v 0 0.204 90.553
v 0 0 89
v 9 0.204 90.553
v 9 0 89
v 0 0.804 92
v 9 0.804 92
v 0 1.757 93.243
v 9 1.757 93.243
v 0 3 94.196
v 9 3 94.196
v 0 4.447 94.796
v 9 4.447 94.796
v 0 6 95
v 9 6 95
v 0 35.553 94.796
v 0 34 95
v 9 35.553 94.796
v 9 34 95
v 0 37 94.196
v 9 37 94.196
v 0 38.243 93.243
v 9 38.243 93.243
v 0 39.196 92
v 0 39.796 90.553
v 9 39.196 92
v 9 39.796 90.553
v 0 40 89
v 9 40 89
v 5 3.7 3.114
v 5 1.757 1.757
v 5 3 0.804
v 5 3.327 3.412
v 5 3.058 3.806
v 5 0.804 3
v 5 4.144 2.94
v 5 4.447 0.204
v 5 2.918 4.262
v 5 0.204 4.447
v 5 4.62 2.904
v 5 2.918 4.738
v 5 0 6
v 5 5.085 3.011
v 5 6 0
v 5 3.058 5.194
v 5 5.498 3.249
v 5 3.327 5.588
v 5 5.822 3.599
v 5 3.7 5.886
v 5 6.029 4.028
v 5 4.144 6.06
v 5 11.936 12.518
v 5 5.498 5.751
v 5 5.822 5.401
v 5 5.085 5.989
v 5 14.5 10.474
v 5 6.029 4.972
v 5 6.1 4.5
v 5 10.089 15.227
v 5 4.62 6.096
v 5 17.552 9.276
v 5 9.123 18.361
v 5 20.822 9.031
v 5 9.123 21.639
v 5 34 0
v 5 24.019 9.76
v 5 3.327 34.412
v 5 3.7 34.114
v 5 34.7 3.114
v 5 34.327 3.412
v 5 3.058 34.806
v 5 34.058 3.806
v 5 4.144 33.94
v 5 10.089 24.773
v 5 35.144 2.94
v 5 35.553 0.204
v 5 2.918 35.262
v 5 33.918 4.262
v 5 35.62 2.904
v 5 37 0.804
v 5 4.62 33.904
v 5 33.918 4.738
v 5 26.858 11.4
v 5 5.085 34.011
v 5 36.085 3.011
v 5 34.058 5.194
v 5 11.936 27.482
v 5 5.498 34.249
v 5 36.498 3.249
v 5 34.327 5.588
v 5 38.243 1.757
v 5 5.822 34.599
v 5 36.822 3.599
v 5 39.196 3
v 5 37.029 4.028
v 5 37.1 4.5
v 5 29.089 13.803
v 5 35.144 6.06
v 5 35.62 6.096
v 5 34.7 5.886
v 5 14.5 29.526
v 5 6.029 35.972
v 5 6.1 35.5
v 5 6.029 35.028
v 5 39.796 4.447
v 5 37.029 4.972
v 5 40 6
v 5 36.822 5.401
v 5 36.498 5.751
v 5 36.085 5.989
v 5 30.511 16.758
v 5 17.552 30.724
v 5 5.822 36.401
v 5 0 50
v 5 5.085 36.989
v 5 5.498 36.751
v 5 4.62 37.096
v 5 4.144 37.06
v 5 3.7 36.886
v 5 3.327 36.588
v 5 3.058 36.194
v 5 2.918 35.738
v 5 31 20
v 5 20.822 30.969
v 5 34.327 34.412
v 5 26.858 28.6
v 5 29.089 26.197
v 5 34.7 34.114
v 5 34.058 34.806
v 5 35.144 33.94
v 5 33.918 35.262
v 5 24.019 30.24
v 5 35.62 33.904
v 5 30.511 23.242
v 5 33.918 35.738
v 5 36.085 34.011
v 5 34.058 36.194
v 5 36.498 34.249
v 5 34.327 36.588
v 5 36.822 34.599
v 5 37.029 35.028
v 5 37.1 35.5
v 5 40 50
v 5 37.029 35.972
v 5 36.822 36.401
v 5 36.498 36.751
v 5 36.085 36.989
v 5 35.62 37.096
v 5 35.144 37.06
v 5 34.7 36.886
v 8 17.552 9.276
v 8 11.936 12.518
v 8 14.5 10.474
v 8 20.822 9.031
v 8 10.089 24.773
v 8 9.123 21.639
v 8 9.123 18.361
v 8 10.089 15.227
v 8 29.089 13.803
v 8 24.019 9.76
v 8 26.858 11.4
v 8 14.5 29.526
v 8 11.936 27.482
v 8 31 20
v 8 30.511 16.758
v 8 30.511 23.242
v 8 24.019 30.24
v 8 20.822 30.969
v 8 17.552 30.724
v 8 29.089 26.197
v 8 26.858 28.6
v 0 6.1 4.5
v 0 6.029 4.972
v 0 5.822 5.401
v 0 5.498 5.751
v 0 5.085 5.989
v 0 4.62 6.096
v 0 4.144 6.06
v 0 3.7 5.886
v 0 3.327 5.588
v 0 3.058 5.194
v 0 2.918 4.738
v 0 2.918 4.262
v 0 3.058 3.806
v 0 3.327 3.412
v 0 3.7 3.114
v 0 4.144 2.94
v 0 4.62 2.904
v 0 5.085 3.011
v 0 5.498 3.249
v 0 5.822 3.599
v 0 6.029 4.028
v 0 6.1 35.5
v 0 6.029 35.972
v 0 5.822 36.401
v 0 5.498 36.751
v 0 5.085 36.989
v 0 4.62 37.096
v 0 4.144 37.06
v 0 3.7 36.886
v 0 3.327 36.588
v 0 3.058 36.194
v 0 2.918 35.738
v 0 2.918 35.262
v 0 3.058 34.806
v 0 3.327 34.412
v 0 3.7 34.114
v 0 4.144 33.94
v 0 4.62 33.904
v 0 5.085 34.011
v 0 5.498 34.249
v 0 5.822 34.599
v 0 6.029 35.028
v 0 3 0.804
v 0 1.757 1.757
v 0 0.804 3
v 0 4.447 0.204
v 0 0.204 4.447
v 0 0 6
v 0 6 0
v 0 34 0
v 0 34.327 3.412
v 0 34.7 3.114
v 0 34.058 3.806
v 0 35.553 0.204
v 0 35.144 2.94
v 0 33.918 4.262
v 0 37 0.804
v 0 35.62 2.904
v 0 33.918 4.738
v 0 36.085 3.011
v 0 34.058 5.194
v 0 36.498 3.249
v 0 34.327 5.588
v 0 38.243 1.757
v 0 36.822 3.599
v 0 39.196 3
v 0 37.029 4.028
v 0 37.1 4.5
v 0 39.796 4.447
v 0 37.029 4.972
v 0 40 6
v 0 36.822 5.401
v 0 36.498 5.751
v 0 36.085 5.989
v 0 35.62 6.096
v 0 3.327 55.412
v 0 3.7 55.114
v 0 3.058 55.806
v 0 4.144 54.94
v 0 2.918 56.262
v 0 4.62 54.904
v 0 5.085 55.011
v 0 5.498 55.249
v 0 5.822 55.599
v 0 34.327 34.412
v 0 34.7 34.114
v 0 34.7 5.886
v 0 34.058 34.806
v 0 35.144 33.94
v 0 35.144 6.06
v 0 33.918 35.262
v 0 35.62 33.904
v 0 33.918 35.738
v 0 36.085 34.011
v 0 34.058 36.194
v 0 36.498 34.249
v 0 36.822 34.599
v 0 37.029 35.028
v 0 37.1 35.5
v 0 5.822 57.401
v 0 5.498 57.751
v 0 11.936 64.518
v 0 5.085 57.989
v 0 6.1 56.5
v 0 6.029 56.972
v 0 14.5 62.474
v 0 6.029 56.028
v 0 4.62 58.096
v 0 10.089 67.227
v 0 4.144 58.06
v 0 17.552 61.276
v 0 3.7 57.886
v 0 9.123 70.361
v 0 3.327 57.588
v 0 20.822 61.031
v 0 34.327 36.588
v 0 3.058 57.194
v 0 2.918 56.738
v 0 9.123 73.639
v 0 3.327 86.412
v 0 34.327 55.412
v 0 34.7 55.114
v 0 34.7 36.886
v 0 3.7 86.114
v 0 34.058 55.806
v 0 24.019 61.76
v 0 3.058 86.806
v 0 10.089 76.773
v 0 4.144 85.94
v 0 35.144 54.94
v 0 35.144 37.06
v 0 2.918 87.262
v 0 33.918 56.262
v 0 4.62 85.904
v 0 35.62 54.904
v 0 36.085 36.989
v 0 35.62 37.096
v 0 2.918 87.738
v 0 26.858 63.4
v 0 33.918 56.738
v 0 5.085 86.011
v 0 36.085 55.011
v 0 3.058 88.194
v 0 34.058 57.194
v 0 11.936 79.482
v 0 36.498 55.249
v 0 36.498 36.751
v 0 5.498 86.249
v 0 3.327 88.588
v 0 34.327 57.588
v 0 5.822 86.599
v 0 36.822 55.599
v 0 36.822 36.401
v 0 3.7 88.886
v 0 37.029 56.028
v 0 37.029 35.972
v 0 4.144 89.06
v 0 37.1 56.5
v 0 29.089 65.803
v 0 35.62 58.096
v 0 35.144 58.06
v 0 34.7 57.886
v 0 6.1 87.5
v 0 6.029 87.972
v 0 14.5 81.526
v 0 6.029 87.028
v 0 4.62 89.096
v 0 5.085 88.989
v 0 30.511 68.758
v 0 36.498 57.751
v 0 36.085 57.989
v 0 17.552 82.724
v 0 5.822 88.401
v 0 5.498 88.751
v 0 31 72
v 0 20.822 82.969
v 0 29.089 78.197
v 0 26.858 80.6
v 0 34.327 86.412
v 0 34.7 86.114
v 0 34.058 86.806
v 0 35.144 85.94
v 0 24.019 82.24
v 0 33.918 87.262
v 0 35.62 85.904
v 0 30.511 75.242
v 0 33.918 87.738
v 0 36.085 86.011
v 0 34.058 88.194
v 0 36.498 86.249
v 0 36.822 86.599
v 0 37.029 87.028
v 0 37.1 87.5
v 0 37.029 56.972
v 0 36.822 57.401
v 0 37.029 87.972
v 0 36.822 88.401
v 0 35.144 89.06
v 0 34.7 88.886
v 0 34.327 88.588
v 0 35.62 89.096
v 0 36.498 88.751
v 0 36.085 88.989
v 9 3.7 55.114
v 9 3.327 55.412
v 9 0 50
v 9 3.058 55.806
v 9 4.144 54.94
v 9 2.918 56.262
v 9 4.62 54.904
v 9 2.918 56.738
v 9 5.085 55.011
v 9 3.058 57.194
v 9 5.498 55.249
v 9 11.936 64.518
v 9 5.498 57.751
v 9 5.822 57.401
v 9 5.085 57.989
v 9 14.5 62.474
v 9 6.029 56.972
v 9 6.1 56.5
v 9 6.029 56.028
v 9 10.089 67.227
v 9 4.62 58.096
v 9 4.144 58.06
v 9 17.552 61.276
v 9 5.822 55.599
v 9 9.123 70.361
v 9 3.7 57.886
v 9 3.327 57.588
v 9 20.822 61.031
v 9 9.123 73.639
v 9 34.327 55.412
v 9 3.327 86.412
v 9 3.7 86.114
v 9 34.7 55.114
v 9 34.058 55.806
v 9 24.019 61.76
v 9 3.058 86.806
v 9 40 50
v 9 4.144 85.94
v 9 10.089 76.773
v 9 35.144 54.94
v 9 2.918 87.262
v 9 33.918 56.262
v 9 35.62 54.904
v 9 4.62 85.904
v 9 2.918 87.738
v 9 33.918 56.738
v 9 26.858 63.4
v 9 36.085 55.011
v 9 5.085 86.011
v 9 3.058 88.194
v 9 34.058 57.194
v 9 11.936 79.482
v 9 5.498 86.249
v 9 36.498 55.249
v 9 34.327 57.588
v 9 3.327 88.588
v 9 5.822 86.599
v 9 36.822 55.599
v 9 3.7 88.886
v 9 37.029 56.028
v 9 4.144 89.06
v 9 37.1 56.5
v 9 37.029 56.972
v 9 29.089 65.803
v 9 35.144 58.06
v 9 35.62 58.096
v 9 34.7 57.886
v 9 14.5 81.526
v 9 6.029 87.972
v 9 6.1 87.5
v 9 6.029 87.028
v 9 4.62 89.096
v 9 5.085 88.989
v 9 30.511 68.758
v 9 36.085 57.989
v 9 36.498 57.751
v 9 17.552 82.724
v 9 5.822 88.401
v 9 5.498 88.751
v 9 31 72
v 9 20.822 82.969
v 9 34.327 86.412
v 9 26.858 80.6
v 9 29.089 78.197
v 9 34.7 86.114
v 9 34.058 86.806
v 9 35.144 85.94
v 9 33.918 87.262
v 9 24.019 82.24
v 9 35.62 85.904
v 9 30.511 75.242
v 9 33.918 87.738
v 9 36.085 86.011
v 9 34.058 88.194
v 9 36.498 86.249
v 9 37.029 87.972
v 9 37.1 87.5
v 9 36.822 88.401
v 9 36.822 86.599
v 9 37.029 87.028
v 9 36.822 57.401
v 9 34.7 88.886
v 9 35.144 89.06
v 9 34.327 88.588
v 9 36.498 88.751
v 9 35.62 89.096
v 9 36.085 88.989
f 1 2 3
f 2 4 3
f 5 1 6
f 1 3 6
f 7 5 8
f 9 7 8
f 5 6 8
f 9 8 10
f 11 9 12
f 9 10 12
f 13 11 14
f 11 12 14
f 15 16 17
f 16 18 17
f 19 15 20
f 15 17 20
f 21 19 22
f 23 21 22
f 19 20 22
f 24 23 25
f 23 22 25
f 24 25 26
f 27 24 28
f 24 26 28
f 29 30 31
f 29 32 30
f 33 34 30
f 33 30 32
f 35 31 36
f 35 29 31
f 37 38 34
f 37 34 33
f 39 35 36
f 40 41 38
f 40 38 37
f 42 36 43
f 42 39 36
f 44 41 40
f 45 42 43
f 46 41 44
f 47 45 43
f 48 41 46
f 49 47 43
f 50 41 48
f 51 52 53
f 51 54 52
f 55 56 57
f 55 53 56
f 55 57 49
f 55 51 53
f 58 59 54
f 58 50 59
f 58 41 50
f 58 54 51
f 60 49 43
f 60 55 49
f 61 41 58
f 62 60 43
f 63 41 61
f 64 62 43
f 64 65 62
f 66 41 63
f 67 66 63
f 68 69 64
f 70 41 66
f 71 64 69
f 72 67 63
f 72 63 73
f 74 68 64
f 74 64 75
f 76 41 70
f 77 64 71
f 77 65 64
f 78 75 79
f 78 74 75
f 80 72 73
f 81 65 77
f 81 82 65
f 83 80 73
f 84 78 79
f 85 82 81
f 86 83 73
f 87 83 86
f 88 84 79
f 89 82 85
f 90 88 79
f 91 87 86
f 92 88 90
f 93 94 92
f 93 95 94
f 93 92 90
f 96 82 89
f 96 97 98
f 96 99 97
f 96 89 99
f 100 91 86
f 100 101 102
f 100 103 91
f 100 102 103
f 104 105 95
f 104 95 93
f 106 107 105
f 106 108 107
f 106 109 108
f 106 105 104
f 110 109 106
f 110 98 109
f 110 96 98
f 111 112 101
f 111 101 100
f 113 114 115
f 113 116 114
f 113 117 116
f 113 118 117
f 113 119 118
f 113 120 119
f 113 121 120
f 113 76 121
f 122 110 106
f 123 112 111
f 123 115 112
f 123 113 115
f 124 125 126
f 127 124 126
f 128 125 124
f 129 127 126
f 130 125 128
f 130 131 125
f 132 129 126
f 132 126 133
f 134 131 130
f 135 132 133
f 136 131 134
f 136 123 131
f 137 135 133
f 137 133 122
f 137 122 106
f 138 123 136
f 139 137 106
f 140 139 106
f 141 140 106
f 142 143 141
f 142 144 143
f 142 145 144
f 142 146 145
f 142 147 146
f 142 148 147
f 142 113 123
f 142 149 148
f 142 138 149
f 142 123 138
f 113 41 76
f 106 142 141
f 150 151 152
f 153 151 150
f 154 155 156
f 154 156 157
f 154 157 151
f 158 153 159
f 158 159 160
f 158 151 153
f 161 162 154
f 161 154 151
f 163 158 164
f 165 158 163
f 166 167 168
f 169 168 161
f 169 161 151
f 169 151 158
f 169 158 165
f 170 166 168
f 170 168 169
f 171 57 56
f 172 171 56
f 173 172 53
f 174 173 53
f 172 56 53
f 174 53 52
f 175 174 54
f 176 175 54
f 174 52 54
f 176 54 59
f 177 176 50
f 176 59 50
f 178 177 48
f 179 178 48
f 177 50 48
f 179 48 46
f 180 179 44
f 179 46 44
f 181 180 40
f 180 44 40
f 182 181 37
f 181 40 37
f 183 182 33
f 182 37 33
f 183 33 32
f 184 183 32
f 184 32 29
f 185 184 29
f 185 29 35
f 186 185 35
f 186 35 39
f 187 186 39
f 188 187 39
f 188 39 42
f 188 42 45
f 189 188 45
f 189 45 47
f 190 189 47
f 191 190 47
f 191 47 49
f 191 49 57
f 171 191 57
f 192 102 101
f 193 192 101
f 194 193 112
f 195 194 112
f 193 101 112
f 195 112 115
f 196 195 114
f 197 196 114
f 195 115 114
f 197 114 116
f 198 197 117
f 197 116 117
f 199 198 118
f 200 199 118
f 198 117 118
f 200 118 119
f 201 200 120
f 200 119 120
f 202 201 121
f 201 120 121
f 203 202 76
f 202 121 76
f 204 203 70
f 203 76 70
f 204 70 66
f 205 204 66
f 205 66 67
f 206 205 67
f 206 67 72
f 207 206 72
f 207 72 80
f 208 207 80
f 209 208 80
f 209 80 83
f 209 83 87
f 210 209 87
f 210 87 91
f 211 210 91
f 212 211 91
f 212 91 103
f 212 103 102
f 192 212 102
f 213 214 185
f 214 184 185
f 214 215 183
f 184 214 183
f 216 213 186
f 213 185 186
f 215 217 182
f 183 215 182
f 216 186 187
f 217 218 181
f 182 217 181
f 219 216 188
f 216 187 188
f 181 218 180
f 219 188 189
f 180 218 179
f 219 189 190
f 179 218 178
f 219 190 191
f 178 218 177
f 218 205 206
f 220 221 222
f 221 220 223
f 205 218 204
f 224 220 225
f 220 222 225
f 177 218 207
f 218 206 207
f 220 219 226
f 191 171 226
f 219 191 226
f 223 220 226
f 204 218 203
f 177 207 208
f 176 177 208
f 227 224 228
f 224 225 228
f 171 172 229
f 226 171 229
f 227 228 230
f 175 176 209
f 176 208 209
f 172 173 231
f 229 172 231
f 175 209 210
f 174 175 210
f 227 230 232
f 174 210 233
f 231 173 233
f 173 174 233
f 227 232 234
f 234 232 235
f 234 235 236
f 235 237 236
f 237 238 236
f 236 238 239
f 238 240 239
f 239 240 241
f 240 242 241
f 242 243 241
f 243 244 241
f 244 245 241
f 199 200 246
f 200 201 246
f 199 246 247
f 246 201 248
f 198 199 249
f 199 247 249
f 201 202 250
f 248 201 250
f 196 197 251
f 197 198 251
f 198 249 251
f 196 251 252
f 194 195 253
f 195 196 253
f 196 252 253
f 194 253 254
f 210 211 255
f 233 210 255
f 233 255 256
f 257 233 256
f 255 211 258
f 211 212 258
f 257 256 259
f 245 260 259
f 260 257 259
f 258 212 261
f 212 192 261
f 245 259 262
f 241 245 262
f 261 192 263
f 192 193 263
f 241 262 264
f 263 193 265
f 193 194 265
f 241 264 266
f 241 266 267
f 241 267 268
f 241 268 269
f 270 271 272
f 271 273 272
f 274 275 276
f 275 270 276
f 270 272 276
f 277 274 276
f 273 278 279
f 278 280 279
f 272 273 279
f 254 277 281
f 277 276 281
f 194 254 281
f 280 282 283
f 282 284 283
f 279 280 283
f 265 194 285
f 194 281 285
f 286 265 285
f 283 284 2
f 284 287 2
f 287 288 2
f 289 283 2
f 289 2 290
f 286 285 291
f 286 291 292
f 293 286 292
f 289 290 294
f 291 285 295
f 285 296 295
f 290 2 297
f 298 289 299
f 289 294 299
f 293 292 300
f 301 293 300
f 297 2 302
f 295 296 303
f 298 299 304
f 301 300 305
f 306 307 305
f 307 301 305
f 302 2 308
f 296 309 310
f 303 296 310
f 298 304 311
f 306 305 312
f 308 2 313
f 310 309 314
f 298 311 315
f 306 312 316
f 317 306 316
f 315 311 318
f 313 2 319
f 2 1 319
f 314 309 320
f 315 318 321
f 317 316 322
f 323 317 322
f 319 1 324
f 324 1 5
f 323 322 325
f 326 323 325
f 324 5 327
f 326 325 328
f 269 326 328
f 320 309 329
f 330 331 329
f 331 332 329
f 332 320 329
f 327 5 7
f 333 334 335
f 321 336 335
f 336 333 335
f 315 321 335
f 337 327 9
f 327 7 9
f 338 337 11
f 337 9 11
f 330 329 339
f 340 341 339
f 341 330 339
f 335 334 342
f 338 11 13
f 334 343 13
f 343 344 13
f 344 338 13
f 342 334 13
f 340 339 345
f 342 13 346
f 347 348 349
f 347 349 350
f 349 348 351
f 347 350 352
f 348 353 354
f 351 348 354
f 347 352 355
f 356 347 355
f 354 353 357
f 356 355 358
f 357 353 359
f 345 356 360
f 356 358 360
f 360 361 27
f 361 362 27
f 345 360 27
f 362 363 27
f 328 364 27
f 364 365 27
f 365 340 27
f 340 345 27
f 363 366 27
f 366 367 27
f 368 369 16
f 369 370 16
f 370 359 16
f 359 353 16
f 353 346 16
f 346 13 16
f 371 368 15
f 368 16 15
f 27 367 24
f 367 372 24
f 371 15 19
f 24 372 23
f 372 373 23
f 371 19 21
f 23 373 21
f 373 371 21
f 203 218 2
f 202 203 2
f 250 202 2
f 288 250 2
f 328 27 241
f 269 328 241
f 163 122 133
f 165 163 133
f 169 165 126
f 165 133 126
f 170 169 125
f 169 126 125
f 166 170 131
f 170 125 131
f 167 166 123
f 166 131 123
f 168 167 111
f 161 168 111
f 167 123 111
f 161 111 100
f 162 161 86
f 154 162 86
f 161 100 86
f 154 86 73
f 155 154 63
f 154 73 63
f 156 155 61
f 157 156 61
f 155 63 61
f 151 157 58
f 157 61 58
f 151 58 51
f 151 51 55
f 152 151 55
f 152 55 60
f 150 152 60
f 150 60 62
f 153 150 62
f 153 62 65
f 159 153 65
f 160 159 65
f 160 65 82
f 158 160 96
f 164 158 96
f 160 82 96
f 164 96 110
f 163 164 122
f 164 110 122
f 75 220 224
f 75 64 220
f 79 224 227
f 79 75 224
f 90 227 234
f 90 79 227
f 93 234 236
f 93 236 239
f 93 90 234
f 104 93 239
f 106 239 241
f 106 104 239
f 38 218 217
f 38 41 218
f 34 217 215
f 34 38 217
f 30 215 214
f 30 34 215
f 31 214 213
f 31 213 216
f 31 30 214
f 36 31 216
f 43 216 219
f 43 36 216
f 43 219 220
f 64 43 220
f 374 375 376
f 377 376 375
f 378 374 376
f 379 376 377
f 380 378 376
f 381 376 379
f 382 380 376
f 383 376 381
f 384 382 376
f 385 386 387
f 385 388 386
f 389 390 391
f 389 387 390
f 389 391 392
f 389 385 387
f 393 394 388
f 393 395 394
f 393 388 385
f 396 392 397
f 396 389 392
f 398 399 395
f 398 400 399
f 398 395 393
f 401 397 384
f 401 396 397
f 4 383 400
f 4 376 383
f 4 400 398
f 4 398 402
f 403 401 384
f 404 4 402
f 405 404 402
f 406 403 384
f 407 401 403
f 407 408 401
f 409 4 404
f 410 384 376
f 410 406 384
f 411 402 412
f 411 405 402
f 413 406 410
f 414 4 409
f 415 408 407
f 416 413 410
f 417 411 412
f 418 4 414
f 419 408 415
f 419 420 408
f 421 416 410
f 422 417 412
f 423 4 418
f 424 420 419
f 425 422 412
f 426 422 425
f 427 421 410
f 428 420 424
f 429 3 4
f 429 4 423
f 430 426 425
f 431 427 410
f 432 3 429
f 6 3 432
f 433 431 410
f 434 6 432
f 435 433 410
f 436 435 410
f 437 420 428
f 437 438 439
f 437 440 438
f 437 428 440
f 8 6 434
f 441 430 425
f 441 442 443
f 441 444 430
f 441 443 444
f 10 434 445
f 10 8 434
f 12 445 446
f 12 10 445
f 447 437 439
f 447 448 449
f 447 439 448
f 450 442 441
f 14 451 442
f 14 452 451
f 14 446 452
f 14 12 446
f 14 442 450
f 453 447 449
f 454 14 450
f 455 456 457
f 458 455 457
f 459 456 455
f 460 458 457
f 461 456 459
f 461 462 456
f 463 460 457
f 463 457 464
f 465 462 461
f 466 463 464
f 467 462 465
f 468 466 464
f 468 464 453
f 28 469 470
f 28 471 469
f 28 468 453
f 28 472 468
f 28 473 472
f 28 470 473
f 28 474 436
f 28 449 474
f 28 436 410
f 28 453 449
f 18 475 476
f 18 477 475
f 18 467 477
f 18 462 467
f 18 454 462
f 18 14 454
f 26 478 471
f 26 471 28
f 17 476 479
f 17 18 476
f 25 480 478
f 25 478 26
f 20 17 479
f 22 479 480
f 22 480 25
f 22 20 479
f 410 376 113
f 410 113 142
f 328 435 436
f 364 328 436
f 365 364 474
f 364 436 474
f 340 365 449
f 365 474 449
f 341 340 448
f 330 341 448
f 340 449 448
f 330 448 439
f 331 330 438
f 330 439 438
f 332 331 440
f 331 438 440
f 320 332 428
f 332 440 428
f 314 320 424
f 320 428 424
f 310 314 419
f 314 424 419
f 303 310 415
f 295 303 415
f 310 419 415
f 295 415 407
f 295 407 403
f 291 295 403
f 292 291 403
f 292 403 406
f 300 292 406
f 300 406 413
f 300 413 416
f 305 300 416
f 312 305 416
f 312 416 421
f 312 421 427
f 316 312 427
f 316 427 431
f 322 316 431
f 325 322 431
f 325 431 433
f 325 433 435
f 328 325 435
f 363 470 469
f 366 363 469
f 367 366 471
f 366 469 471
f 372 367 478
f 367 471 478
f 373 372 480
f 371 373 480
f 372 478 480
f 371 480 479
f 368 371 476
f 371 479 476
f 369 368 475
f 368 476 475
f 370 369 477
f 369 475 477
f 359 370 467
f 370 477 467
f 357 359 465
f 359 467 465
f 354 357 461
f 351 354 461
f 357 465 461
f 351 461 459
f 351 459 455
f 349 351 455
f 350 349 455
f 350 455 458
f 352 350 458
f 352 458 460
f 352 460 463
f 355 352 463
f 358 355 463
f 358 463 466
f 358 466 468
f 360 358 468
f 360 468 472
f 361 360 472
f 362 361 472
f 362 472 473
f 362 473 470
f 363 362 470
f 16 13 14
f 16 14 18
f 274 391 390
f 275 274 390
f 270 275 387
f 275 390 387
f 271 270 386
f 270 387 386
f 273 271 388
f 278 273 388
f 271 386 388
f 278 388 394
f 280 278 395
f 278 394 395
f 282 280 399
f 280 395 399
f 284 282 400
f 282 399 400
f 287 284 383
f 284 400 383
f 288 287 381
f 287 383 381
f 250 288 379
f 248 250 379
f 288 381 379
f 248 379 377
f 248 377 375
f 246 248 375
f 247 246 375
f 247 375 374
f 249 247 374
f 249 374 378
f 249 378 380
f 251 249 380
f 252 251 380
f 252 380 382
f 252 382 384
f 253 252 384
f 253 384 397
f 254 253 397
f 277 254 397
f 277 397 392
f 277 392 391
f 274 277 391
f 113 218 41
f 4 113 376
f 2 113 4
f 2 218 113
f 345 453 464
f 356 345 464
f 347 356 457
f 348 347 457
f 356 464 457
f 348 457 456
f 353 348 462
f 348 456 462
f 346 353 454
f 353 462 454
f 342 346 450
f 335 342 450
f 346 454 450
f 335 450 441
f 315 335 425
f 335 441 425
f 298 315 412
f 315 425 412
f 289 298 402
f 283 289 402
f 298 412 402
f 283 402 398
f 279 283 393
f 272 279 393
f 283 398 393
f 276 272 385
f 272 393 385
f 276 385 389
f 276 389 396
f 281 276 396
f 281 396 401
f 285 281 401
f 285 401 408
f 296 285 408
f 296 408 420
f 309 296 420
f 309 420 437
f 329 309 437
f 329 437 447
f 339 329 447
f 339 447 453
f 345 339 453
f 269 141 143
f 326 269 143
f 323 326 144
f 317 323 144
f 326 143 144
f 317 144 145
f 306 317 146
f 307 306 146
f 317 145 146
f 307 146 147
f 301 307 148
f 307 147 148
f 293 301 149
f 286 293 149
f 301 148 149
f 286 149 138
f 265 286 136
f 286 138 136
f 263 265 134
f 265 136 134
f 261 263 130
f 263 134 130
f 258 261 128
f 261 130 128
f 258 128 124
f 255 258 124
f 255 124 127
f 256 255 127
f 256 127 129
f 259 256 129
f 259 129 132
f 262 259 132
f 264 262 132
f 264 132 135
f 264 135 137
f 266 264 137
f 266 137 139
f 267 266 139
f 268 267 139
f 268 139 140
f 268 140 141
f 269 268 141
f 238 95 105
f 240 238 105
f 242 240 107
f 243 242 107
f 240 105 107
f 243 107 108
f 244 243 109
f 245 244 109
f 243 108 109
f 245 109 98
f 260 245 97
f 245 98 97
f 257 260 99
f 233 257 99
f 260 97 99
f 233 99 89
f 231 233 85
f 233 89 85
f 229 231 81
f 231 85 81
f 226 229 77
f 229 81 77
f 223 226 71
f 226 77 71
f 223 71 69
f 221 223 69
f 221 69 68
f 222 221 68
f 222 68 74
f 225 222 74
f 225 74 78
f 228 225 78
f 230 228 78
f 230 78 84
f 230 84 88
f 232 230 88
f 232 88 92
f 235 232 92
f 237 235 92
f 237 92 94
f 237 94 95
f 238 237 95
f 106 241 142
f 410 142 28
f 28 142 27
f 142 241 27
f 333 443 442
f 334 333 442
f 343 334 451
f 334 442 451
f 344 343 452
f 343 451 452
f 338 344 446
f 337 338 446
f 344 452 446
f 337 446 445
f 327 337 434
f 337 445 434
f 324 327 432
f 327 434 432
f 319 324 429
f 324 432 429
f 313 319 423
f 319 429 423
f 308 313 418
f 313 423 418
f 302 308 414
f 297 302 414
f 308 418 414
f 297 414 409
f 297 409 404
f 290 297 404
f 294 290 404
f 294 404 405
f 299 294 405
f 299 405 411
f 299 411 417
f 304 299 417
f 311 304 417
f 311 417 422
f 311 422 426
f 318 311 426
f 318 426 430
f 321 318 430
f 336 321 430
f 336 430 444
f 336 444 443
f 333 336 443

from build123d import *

# Parameters (mm, degrees)
SKETCH_W        = 40
SKETCH_H        = 95
PAD_DEPTH       = 9
SKETCH001_W     = 40
SKETCH001_H     = 50
POCKET_DEPTH    = 4
SKETCH002_R     = 11
PAD001_DEPTH    = 3
SKETCH003_R     = 1.6
POCKET001_DEPTH = 8
SKETCH004_R     = 11
SKETCH004_R_2   = 1.6
POCKET002_DEPTH = 10
FILLET_R        = 6


with BuildPart() as part:
    # Sketch → Pad (new body)
    with BuildSketch(Plane.YZ):
        with Locations((20, 47.5)):
            Rectangle(SKETCH_W, SKETCH_H)
    extrude(amount=PAD_DEPTH)

    # Sketch001 (on Face6 of Pad) → Pocket (cut)
    with BuildSketch(Plane.YZ.offset(9)):
        with Locations((20, 25)):
            Rectangle(SKETCH001_W, SKETCH001_H)
    extrude(amount=-POCKET_DEPTH, mode=Mode.SUBTRACT)

    # Sketch002 (on Face4 of Pocket) → Pad001 (join)
    with BuildSketch(Plane.YZ.offset(5)):
        with Locations((20, 20)):
            Circle(SKETCH002_R)
    extrude(amount=PAD001_DEPTH)

    # Sketch003 (on Face4 of Pad001) → Pocket001 (cut)
    with BuildSketch(Plane.YZ.offset(5)):
        with Locations((4.5, 35.5)):
            Circle(SKETCH003_R)
        with Locations((35.5, 35.5)):
            Circle(SKETCH003_R)
        with Locations((35.5, 4.5)):
            Circle(SKETCH003_R)
        with Locations((4.5, 4.5)):
            Circle(SKETCH003_R)
    extrude(amount=-POCKET001_DEPTH, mode=Mode.SUBTRACT)

    # Sketch004 (on Face11 of Pocket001) → Pocket002 (cut)
    with BuildSketch(Plane.YZ.offset(9)):
        with Locations((20, 72)):
            Circle(SKETCH004_R)
        with Locations((4.5, 87.5)):
            Circle(SKETCH004_R_2)
        with Locations((35.5, 87.5)):
            Circle(SKETCH004_R_2)
        with Locations((35.5, 56.5)):
            Circle(SKETCH004_R_2)
        with Locations((4.5, 56.5)):
            Circle(SKETCH004_R_2)
    extrude(amount=-POCKET002_DEPTH, mode=Mode.SUBTRACT)

    # Fillet
    fillet_edges = [part.edges().sort_by_distance(p)[0] for p in [
        (4.5, 0, 95),
        (4.5, 40, 95),
        (2.5, 40, 0),
        (2.5, 0, 0),
    ]]
    fillet(fillet_edges, radius=FILLET_R)


solid = part.part
